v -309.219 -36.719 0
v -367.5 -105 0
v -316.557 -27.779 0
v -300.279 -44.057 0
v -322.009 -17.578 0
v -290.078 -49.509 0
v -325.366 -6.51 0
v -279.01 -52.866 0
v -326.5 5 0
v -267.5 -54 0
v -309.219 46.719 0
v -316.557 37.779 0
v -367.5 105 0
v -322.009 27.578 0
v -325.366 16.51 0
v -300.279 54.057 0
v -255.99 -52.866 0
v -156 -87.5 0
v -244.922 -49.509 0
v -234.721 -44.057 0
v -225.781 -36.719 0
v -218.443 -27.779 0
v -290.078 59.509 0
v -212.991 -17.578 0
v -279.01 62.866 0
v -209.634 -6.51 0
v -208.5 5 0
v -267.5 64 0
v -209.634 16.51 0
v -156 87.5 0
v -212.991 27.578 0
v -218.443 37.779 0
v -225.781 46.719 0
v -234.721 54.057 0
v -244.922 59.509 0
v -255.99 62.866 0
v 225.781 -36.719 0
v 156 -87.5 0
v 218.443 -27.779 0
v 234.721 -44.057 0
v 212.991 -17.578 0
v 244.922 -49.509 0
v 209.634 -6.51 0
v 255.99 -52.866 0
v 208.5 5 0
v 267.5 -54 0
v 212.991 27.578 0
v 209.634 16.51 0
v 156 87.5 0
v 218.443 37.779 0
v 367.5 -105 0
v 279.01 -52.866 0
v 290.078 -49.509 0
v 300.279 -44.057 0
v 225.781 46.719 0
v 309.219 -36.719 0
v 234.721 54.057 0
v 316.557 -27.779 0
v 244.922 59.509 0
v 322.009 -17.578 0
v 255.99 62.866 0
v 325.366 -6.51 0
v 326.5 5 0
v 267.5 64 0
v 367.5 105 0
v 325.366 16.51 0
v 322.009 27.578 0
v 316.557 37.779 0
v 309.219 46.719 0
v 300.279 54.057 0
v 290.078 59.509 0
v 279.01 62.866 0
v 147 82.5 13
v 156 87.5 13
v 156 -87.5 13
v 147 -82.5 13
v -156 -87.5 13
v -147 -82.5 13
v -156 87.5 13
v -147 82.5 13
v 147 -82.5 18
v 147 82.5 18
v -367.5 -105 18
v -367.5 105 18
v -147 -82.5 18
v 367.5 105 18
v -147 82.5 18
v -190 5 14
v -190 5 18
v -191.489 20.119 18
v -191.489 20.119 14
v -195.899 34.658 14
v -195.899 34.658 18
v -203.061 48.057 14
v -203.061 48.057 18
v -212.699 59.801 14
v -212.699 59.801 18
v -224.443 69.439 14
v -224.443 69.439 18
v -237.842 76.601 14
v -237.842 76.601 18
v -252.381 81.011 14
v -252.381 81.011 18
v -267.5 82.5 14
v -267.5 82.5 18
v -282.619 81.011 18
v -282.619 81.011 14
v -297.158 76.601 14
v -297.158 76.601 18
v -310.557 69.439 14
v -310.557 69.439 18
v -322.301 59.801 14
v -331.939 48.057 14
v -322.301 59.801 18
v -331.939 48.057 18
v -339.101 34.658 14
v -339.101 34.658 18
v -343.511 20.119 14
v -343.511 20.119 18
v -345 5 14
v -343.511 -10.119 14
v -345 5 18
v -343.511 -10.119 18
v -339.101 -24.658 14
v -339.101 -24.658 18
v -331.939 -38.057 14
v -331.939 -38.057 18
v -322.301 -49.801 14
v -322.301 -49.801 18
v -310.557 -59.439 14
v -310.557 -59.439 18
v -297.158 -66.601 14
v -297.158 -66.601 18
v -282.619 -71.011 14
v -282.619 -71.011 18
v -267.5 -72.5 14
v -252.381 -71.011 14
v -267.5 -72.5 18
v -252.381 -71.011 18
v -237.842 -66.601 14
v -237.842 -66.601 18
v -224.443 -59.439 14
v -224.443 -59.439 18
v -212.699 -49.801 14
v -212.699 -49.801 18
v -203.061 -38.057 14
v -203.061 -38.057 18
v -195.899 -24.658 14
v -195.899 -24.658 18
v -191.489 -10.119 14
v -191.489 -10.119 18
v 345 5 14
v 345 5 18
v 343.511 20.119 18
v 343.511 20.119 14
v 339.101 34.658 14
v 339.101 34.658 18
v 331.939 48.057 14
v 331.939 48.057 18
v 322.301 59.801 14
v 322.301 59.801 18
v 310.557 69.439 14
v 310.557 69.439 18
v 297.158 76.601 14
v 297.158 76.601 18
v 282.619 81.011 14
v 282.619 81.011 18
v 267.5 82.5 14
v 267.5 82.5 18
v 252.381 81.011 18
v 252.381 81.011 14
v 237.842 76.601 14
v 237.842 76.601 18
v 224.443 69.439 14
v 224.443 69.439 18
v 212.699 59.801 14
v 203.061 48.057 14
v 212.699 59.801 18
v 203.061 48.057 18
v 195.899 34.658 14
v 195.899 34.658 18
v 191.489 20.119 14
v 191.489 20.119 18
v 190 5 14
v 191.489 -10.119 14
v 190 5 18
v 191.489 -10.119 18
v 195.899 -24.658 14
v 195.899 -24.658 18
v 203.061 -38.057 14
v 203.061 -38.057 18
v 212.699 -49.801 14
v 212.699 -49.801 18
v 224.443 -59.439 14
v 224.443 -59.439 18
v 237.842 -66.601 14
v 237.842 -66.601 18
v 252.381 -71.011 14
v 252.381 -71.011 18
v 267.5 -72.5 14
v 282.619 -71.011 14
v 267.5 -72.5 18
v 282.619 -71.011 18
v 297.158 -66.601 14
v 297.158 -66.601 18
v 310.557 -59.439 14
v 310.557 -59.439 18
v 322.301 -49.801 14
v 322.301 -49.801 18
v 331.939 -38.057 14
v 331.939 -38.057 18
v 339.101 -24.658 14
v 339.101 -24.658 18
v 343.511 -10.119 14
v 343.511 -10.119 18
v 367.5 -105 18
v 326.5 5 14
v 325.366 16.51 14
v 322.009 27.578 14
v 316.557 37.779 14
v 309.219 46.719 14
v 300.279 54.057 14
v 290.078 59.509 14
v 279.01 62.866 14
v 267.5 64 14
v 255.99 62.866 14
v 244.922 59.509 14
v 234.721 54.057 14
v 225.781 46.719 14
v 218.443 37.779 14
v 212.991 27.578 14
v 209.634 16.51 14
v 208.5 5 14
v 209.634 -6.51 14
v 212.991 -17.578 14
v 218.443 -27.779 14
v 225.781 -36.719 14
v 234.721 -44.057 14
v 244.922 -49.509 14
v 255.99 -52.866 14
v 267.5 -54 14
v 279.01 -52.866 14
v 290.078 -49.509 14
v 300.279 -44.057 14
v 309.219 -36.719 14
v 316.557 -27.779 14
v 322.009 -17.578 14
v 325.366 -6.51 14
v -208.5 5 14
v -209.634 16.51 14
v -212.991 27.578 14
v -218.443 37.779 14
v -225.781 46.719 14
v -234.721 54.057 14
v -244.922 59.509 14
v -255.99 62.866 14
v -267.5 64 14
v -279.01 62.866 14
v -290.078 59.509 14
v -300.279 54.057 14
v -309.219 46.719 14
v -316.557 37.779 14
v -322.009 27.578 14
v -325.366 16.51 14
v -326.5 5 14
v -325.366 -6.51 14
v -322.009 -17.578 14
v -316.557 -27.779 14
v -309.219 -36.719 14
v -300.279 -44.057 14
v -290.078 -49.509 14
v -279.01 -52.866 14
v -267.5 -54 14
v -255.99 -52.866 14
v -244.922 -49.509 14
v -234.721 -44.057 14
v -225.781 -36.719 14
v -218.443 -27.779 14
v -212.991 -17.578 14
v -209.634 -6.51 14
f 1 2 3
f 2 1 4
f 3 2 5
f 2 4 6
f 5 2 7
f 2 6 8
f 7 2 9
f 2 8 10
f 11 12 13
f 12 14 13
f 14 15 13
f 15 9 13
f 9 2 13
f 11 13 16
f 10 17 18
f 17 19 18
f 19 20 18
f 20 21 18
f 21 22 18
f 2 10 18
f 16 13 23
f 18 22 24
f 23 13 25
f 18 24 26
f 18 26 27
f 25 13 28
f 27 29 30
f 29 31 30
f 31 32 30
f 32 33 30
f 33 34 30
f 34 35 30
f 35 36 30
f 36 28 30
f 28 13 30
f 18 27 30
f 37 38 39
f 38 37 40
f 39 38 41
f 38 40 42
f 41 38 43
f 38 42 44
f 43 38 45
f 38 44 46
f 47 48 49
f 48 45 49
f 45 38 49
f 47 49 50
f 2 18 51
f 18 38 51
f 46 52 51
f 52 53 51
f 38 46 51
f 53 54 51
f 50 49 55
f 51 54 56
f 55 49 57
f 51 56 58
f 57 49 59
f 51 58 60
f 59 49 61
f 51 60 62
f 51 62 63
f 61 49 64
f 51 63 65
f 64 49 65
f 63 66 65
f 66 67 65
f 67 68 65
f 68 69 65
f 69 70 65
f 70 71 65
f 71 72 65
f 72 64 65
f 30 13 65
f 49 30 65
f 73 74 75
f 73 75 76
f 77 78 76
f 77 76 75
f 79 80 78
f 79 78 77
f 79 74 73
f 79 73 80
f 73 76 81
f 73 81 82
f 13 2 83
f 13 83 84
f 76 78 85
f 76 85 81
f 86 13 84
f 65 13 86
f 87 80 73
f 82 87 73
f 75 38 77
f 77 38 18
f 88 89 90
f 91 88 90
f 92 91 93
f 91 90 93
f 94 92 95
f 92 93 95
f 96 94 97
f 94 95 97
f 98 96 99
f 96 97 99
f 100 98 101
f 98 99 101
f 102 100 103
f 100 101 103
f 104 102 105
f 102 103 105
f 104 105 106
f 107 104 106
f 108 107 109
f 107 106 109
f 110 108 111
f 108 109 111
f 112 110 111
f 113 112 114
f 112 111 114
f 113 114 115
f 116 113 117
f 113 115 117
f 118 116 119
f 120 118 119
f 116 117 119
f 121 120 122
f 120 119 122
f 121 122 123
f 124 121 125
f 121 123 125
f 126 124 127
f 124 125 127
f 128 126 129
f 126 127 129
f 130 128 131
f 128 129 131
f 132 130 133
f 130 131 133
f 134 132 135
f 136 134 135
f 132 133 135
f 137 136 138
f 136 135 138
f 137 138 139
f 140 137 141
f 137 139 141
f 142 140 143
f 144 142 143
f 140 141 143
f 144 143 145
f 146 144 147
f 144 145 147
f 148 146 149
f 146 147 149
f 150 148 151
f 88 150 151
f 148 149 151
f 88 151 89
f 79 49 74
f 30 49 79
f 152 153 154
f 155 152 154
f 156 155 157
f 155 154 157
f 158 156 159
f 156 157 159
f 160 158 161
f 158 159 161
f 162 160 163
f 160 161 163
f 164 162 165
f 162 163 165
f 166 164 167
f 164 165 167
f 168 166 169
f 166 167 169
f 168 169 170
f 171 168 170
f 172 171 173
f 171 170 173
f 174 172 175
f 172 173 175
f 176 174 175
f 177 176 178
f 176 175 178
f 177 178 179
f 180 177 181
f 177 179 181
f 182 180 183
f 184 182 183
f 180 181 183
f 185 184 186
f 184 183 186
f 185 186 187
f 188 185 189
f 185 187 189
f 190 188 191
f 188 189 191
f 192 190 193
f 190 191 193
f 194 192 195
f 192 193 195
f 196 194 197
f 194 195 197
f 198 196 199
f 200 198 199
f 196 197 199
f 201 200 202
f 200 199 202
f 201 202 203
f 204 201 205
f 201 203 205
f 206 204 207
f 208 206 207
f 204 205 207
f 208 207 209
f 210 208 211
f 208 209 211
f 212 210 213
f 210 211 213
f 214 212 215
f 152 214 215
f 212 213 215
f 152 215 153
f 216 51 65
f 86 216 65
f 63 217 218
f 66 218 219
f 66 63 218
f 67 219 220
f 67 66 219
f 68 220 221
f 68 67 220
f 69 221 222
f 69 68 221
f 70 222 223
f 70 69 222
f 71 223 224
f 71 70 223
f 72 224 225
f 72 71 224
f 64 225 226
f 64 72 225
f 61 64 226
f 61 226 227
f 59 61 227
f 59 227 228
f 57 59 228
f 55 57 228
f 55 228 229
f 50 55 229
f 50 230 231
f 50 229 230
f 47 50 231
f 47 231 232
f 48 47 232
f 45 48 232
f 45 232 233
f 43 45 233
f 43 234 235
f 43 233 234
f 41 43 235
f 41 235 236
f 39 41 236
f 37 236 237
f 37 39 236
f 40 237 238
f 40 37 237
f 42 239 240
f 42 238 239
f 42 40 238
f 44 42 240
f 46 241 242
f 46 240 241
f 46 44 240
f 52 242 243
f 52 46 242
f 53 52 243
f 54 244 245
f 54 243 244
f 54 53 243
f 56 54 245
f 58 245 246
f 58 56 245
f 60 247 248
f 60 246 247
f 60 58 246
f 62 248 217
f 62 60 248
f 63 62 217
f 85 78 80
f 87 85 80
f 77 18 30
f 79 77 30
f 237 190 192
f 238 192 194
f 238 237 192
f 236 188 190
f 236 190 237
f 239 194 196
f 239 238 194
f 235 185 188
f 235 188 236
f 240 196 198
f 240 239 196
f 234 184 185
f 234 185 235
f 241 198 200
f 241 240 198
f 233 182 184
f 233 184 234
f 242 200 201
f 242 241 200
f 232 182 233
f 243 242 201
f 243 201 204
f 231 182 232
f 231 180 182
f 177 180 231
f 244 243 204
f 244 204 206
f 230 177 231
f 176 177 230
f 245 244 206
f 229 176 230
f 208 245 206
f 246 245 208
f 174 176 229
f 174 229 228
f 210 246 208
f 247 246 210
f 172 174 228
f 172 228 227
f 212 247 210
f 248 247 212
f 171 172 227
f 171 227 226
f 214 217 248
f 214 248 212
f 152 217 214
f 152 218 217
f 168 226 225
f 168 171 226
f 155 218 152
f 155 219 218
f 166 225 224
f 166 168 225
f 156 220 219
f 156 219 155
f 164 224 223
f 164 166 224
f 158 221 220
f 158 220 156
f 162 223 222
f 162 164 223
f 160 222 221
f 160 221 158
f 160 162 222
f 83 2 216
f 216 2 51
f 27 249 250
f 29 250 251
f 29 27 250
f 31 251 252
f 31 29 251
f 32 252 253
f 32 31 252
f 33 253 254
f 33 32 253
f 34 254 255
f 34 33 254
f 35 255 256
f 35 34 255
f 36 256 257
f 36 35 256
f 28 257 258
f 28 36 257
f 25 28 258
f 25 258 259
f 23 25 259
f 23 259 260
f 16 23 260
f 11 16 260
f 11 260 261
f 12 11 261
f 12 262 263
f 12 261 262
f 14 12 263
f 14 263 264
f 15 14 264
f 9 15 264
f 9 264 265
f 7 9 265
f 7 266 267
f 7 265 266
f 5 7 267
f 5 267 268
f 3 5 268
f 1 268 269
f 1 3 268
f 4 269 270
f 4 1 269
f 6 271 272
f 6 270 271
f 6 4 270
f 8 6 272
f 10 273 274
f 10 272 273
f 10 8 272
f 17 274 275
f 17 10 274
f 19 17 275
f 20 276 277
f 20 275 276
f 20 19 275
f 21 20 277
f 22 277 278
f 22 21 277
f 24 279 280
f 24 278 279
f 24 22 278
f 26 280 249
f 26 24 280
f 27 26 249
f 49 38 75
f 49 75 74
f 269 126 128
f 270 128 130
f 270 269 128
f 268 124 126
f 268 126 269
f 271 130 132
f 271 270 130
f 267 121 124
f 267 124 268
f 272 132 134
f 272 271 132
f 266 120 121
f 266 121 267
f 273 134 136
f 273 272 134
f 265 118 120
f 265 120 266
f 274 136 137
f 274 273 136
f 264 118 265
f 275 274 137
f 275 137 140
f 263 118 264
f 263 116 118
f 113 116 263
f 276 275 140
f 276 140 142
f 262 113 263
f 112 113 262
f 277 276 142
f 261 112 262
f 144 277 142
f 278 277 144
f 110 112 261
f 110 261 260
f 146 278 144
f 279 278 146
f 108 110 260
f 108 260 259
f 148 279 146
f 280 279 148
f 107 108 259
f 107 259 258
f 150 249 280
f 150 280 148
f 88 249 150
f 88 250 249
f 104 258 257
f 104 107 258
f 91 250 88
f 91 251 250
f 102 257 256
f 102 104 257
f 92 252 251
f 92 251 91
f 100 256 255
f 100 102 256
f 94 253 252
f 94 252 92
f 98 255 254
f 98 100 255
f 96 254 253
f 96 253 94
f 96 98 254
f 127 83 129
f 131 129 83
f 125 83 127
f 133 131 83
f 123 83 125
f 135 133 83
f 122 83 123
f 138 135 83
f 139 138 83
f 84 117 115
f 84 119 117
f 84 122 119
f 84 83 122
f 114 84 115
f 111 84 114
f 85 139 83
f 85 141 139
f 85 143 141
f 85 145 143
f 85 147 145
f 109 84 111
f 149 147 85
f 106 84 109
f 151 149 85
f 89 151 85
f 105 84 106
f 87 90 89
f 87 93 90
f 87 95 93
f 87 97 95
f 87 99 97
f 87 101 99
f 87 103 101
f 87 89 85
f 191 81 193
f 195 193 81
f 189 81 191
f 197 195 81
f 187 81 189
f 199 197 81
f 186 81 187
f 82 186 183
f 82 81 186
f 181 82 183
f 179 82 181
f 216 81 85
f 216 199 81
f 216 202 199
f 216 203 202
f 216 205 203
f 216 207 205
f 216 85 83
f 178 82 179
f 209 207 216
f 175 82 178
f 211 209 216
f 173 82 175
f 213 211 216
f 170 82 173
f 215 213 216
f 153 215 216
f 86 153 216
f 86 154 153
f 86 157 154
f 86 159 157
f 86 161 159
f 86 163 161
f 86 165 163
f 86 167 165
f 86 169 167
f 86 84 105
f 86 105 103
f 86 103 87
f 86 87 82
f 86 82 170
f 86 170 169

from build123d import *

# Parameters (mm, degrees)
SKETCH2_W           = 735
SKETCH2_H           = 210
SKETCH2_R           = 59
SKETCH2_W_2         = 294
SKETCH2_H_2         = 165
BOSS_EXTRUDE1_DEPTH = 18
SKETCH3_R           = 77.5
CUT_EXTRUDE1_DEPTH  = 4
SKETCH4_W           = 312
SKETCH4_H           = 175
CUT_EXTRUDE2_DEPTH  = 13


with BuildPart() as part:
    # Sketch2 → Boss-Extrude1 (new body)
    with BuildSketch(Plane.XY):
        Rectangle(SKETCH2_W, SKETCH2_H)
        with Locations((-267.5, 5)):
            Circle(SKETCH2_R, mode=Mode.SUBTRACT)
        with Locations((267.5, 5)):
            Circle(SKETCH2_R, mode=Mode.SUBTRACT)
        Rectangle(SKETCH2_W_2, SKETCH2_H_2, mode=Mode.SUBTRACT)
    extrude(amount=BOSS_EXTRUDE1_DEPTH)

    # Sketch3 → Cut-Extrude1 (cut)
    with BuildSketch(Plane.XY.offset(18)):
        with Locations((-267.5, 5)):
            Circle(SKETCH3_R)
        with Locations((267.5, 5)):
            Circle(SKETCH3_R)
    extrude(amount=-CUT_EXTRUDE1_DEPTH, mode=Mode.SUBTRACT)

    # Sketch4 → Cut-Extrude2 (cut)
    with BuildSketch(Plane(origin=(0, 0, 0), x_dir=(-1, 0, 0), z_dir=(0, 0, -1))):
        Rectangle(SKETCH4_W, SKETCH4_H)
    extrude(amount=-CUT_EXTRUDE2_DEPTH, mode=Mode.SUBTRACT)


solid = part.part
